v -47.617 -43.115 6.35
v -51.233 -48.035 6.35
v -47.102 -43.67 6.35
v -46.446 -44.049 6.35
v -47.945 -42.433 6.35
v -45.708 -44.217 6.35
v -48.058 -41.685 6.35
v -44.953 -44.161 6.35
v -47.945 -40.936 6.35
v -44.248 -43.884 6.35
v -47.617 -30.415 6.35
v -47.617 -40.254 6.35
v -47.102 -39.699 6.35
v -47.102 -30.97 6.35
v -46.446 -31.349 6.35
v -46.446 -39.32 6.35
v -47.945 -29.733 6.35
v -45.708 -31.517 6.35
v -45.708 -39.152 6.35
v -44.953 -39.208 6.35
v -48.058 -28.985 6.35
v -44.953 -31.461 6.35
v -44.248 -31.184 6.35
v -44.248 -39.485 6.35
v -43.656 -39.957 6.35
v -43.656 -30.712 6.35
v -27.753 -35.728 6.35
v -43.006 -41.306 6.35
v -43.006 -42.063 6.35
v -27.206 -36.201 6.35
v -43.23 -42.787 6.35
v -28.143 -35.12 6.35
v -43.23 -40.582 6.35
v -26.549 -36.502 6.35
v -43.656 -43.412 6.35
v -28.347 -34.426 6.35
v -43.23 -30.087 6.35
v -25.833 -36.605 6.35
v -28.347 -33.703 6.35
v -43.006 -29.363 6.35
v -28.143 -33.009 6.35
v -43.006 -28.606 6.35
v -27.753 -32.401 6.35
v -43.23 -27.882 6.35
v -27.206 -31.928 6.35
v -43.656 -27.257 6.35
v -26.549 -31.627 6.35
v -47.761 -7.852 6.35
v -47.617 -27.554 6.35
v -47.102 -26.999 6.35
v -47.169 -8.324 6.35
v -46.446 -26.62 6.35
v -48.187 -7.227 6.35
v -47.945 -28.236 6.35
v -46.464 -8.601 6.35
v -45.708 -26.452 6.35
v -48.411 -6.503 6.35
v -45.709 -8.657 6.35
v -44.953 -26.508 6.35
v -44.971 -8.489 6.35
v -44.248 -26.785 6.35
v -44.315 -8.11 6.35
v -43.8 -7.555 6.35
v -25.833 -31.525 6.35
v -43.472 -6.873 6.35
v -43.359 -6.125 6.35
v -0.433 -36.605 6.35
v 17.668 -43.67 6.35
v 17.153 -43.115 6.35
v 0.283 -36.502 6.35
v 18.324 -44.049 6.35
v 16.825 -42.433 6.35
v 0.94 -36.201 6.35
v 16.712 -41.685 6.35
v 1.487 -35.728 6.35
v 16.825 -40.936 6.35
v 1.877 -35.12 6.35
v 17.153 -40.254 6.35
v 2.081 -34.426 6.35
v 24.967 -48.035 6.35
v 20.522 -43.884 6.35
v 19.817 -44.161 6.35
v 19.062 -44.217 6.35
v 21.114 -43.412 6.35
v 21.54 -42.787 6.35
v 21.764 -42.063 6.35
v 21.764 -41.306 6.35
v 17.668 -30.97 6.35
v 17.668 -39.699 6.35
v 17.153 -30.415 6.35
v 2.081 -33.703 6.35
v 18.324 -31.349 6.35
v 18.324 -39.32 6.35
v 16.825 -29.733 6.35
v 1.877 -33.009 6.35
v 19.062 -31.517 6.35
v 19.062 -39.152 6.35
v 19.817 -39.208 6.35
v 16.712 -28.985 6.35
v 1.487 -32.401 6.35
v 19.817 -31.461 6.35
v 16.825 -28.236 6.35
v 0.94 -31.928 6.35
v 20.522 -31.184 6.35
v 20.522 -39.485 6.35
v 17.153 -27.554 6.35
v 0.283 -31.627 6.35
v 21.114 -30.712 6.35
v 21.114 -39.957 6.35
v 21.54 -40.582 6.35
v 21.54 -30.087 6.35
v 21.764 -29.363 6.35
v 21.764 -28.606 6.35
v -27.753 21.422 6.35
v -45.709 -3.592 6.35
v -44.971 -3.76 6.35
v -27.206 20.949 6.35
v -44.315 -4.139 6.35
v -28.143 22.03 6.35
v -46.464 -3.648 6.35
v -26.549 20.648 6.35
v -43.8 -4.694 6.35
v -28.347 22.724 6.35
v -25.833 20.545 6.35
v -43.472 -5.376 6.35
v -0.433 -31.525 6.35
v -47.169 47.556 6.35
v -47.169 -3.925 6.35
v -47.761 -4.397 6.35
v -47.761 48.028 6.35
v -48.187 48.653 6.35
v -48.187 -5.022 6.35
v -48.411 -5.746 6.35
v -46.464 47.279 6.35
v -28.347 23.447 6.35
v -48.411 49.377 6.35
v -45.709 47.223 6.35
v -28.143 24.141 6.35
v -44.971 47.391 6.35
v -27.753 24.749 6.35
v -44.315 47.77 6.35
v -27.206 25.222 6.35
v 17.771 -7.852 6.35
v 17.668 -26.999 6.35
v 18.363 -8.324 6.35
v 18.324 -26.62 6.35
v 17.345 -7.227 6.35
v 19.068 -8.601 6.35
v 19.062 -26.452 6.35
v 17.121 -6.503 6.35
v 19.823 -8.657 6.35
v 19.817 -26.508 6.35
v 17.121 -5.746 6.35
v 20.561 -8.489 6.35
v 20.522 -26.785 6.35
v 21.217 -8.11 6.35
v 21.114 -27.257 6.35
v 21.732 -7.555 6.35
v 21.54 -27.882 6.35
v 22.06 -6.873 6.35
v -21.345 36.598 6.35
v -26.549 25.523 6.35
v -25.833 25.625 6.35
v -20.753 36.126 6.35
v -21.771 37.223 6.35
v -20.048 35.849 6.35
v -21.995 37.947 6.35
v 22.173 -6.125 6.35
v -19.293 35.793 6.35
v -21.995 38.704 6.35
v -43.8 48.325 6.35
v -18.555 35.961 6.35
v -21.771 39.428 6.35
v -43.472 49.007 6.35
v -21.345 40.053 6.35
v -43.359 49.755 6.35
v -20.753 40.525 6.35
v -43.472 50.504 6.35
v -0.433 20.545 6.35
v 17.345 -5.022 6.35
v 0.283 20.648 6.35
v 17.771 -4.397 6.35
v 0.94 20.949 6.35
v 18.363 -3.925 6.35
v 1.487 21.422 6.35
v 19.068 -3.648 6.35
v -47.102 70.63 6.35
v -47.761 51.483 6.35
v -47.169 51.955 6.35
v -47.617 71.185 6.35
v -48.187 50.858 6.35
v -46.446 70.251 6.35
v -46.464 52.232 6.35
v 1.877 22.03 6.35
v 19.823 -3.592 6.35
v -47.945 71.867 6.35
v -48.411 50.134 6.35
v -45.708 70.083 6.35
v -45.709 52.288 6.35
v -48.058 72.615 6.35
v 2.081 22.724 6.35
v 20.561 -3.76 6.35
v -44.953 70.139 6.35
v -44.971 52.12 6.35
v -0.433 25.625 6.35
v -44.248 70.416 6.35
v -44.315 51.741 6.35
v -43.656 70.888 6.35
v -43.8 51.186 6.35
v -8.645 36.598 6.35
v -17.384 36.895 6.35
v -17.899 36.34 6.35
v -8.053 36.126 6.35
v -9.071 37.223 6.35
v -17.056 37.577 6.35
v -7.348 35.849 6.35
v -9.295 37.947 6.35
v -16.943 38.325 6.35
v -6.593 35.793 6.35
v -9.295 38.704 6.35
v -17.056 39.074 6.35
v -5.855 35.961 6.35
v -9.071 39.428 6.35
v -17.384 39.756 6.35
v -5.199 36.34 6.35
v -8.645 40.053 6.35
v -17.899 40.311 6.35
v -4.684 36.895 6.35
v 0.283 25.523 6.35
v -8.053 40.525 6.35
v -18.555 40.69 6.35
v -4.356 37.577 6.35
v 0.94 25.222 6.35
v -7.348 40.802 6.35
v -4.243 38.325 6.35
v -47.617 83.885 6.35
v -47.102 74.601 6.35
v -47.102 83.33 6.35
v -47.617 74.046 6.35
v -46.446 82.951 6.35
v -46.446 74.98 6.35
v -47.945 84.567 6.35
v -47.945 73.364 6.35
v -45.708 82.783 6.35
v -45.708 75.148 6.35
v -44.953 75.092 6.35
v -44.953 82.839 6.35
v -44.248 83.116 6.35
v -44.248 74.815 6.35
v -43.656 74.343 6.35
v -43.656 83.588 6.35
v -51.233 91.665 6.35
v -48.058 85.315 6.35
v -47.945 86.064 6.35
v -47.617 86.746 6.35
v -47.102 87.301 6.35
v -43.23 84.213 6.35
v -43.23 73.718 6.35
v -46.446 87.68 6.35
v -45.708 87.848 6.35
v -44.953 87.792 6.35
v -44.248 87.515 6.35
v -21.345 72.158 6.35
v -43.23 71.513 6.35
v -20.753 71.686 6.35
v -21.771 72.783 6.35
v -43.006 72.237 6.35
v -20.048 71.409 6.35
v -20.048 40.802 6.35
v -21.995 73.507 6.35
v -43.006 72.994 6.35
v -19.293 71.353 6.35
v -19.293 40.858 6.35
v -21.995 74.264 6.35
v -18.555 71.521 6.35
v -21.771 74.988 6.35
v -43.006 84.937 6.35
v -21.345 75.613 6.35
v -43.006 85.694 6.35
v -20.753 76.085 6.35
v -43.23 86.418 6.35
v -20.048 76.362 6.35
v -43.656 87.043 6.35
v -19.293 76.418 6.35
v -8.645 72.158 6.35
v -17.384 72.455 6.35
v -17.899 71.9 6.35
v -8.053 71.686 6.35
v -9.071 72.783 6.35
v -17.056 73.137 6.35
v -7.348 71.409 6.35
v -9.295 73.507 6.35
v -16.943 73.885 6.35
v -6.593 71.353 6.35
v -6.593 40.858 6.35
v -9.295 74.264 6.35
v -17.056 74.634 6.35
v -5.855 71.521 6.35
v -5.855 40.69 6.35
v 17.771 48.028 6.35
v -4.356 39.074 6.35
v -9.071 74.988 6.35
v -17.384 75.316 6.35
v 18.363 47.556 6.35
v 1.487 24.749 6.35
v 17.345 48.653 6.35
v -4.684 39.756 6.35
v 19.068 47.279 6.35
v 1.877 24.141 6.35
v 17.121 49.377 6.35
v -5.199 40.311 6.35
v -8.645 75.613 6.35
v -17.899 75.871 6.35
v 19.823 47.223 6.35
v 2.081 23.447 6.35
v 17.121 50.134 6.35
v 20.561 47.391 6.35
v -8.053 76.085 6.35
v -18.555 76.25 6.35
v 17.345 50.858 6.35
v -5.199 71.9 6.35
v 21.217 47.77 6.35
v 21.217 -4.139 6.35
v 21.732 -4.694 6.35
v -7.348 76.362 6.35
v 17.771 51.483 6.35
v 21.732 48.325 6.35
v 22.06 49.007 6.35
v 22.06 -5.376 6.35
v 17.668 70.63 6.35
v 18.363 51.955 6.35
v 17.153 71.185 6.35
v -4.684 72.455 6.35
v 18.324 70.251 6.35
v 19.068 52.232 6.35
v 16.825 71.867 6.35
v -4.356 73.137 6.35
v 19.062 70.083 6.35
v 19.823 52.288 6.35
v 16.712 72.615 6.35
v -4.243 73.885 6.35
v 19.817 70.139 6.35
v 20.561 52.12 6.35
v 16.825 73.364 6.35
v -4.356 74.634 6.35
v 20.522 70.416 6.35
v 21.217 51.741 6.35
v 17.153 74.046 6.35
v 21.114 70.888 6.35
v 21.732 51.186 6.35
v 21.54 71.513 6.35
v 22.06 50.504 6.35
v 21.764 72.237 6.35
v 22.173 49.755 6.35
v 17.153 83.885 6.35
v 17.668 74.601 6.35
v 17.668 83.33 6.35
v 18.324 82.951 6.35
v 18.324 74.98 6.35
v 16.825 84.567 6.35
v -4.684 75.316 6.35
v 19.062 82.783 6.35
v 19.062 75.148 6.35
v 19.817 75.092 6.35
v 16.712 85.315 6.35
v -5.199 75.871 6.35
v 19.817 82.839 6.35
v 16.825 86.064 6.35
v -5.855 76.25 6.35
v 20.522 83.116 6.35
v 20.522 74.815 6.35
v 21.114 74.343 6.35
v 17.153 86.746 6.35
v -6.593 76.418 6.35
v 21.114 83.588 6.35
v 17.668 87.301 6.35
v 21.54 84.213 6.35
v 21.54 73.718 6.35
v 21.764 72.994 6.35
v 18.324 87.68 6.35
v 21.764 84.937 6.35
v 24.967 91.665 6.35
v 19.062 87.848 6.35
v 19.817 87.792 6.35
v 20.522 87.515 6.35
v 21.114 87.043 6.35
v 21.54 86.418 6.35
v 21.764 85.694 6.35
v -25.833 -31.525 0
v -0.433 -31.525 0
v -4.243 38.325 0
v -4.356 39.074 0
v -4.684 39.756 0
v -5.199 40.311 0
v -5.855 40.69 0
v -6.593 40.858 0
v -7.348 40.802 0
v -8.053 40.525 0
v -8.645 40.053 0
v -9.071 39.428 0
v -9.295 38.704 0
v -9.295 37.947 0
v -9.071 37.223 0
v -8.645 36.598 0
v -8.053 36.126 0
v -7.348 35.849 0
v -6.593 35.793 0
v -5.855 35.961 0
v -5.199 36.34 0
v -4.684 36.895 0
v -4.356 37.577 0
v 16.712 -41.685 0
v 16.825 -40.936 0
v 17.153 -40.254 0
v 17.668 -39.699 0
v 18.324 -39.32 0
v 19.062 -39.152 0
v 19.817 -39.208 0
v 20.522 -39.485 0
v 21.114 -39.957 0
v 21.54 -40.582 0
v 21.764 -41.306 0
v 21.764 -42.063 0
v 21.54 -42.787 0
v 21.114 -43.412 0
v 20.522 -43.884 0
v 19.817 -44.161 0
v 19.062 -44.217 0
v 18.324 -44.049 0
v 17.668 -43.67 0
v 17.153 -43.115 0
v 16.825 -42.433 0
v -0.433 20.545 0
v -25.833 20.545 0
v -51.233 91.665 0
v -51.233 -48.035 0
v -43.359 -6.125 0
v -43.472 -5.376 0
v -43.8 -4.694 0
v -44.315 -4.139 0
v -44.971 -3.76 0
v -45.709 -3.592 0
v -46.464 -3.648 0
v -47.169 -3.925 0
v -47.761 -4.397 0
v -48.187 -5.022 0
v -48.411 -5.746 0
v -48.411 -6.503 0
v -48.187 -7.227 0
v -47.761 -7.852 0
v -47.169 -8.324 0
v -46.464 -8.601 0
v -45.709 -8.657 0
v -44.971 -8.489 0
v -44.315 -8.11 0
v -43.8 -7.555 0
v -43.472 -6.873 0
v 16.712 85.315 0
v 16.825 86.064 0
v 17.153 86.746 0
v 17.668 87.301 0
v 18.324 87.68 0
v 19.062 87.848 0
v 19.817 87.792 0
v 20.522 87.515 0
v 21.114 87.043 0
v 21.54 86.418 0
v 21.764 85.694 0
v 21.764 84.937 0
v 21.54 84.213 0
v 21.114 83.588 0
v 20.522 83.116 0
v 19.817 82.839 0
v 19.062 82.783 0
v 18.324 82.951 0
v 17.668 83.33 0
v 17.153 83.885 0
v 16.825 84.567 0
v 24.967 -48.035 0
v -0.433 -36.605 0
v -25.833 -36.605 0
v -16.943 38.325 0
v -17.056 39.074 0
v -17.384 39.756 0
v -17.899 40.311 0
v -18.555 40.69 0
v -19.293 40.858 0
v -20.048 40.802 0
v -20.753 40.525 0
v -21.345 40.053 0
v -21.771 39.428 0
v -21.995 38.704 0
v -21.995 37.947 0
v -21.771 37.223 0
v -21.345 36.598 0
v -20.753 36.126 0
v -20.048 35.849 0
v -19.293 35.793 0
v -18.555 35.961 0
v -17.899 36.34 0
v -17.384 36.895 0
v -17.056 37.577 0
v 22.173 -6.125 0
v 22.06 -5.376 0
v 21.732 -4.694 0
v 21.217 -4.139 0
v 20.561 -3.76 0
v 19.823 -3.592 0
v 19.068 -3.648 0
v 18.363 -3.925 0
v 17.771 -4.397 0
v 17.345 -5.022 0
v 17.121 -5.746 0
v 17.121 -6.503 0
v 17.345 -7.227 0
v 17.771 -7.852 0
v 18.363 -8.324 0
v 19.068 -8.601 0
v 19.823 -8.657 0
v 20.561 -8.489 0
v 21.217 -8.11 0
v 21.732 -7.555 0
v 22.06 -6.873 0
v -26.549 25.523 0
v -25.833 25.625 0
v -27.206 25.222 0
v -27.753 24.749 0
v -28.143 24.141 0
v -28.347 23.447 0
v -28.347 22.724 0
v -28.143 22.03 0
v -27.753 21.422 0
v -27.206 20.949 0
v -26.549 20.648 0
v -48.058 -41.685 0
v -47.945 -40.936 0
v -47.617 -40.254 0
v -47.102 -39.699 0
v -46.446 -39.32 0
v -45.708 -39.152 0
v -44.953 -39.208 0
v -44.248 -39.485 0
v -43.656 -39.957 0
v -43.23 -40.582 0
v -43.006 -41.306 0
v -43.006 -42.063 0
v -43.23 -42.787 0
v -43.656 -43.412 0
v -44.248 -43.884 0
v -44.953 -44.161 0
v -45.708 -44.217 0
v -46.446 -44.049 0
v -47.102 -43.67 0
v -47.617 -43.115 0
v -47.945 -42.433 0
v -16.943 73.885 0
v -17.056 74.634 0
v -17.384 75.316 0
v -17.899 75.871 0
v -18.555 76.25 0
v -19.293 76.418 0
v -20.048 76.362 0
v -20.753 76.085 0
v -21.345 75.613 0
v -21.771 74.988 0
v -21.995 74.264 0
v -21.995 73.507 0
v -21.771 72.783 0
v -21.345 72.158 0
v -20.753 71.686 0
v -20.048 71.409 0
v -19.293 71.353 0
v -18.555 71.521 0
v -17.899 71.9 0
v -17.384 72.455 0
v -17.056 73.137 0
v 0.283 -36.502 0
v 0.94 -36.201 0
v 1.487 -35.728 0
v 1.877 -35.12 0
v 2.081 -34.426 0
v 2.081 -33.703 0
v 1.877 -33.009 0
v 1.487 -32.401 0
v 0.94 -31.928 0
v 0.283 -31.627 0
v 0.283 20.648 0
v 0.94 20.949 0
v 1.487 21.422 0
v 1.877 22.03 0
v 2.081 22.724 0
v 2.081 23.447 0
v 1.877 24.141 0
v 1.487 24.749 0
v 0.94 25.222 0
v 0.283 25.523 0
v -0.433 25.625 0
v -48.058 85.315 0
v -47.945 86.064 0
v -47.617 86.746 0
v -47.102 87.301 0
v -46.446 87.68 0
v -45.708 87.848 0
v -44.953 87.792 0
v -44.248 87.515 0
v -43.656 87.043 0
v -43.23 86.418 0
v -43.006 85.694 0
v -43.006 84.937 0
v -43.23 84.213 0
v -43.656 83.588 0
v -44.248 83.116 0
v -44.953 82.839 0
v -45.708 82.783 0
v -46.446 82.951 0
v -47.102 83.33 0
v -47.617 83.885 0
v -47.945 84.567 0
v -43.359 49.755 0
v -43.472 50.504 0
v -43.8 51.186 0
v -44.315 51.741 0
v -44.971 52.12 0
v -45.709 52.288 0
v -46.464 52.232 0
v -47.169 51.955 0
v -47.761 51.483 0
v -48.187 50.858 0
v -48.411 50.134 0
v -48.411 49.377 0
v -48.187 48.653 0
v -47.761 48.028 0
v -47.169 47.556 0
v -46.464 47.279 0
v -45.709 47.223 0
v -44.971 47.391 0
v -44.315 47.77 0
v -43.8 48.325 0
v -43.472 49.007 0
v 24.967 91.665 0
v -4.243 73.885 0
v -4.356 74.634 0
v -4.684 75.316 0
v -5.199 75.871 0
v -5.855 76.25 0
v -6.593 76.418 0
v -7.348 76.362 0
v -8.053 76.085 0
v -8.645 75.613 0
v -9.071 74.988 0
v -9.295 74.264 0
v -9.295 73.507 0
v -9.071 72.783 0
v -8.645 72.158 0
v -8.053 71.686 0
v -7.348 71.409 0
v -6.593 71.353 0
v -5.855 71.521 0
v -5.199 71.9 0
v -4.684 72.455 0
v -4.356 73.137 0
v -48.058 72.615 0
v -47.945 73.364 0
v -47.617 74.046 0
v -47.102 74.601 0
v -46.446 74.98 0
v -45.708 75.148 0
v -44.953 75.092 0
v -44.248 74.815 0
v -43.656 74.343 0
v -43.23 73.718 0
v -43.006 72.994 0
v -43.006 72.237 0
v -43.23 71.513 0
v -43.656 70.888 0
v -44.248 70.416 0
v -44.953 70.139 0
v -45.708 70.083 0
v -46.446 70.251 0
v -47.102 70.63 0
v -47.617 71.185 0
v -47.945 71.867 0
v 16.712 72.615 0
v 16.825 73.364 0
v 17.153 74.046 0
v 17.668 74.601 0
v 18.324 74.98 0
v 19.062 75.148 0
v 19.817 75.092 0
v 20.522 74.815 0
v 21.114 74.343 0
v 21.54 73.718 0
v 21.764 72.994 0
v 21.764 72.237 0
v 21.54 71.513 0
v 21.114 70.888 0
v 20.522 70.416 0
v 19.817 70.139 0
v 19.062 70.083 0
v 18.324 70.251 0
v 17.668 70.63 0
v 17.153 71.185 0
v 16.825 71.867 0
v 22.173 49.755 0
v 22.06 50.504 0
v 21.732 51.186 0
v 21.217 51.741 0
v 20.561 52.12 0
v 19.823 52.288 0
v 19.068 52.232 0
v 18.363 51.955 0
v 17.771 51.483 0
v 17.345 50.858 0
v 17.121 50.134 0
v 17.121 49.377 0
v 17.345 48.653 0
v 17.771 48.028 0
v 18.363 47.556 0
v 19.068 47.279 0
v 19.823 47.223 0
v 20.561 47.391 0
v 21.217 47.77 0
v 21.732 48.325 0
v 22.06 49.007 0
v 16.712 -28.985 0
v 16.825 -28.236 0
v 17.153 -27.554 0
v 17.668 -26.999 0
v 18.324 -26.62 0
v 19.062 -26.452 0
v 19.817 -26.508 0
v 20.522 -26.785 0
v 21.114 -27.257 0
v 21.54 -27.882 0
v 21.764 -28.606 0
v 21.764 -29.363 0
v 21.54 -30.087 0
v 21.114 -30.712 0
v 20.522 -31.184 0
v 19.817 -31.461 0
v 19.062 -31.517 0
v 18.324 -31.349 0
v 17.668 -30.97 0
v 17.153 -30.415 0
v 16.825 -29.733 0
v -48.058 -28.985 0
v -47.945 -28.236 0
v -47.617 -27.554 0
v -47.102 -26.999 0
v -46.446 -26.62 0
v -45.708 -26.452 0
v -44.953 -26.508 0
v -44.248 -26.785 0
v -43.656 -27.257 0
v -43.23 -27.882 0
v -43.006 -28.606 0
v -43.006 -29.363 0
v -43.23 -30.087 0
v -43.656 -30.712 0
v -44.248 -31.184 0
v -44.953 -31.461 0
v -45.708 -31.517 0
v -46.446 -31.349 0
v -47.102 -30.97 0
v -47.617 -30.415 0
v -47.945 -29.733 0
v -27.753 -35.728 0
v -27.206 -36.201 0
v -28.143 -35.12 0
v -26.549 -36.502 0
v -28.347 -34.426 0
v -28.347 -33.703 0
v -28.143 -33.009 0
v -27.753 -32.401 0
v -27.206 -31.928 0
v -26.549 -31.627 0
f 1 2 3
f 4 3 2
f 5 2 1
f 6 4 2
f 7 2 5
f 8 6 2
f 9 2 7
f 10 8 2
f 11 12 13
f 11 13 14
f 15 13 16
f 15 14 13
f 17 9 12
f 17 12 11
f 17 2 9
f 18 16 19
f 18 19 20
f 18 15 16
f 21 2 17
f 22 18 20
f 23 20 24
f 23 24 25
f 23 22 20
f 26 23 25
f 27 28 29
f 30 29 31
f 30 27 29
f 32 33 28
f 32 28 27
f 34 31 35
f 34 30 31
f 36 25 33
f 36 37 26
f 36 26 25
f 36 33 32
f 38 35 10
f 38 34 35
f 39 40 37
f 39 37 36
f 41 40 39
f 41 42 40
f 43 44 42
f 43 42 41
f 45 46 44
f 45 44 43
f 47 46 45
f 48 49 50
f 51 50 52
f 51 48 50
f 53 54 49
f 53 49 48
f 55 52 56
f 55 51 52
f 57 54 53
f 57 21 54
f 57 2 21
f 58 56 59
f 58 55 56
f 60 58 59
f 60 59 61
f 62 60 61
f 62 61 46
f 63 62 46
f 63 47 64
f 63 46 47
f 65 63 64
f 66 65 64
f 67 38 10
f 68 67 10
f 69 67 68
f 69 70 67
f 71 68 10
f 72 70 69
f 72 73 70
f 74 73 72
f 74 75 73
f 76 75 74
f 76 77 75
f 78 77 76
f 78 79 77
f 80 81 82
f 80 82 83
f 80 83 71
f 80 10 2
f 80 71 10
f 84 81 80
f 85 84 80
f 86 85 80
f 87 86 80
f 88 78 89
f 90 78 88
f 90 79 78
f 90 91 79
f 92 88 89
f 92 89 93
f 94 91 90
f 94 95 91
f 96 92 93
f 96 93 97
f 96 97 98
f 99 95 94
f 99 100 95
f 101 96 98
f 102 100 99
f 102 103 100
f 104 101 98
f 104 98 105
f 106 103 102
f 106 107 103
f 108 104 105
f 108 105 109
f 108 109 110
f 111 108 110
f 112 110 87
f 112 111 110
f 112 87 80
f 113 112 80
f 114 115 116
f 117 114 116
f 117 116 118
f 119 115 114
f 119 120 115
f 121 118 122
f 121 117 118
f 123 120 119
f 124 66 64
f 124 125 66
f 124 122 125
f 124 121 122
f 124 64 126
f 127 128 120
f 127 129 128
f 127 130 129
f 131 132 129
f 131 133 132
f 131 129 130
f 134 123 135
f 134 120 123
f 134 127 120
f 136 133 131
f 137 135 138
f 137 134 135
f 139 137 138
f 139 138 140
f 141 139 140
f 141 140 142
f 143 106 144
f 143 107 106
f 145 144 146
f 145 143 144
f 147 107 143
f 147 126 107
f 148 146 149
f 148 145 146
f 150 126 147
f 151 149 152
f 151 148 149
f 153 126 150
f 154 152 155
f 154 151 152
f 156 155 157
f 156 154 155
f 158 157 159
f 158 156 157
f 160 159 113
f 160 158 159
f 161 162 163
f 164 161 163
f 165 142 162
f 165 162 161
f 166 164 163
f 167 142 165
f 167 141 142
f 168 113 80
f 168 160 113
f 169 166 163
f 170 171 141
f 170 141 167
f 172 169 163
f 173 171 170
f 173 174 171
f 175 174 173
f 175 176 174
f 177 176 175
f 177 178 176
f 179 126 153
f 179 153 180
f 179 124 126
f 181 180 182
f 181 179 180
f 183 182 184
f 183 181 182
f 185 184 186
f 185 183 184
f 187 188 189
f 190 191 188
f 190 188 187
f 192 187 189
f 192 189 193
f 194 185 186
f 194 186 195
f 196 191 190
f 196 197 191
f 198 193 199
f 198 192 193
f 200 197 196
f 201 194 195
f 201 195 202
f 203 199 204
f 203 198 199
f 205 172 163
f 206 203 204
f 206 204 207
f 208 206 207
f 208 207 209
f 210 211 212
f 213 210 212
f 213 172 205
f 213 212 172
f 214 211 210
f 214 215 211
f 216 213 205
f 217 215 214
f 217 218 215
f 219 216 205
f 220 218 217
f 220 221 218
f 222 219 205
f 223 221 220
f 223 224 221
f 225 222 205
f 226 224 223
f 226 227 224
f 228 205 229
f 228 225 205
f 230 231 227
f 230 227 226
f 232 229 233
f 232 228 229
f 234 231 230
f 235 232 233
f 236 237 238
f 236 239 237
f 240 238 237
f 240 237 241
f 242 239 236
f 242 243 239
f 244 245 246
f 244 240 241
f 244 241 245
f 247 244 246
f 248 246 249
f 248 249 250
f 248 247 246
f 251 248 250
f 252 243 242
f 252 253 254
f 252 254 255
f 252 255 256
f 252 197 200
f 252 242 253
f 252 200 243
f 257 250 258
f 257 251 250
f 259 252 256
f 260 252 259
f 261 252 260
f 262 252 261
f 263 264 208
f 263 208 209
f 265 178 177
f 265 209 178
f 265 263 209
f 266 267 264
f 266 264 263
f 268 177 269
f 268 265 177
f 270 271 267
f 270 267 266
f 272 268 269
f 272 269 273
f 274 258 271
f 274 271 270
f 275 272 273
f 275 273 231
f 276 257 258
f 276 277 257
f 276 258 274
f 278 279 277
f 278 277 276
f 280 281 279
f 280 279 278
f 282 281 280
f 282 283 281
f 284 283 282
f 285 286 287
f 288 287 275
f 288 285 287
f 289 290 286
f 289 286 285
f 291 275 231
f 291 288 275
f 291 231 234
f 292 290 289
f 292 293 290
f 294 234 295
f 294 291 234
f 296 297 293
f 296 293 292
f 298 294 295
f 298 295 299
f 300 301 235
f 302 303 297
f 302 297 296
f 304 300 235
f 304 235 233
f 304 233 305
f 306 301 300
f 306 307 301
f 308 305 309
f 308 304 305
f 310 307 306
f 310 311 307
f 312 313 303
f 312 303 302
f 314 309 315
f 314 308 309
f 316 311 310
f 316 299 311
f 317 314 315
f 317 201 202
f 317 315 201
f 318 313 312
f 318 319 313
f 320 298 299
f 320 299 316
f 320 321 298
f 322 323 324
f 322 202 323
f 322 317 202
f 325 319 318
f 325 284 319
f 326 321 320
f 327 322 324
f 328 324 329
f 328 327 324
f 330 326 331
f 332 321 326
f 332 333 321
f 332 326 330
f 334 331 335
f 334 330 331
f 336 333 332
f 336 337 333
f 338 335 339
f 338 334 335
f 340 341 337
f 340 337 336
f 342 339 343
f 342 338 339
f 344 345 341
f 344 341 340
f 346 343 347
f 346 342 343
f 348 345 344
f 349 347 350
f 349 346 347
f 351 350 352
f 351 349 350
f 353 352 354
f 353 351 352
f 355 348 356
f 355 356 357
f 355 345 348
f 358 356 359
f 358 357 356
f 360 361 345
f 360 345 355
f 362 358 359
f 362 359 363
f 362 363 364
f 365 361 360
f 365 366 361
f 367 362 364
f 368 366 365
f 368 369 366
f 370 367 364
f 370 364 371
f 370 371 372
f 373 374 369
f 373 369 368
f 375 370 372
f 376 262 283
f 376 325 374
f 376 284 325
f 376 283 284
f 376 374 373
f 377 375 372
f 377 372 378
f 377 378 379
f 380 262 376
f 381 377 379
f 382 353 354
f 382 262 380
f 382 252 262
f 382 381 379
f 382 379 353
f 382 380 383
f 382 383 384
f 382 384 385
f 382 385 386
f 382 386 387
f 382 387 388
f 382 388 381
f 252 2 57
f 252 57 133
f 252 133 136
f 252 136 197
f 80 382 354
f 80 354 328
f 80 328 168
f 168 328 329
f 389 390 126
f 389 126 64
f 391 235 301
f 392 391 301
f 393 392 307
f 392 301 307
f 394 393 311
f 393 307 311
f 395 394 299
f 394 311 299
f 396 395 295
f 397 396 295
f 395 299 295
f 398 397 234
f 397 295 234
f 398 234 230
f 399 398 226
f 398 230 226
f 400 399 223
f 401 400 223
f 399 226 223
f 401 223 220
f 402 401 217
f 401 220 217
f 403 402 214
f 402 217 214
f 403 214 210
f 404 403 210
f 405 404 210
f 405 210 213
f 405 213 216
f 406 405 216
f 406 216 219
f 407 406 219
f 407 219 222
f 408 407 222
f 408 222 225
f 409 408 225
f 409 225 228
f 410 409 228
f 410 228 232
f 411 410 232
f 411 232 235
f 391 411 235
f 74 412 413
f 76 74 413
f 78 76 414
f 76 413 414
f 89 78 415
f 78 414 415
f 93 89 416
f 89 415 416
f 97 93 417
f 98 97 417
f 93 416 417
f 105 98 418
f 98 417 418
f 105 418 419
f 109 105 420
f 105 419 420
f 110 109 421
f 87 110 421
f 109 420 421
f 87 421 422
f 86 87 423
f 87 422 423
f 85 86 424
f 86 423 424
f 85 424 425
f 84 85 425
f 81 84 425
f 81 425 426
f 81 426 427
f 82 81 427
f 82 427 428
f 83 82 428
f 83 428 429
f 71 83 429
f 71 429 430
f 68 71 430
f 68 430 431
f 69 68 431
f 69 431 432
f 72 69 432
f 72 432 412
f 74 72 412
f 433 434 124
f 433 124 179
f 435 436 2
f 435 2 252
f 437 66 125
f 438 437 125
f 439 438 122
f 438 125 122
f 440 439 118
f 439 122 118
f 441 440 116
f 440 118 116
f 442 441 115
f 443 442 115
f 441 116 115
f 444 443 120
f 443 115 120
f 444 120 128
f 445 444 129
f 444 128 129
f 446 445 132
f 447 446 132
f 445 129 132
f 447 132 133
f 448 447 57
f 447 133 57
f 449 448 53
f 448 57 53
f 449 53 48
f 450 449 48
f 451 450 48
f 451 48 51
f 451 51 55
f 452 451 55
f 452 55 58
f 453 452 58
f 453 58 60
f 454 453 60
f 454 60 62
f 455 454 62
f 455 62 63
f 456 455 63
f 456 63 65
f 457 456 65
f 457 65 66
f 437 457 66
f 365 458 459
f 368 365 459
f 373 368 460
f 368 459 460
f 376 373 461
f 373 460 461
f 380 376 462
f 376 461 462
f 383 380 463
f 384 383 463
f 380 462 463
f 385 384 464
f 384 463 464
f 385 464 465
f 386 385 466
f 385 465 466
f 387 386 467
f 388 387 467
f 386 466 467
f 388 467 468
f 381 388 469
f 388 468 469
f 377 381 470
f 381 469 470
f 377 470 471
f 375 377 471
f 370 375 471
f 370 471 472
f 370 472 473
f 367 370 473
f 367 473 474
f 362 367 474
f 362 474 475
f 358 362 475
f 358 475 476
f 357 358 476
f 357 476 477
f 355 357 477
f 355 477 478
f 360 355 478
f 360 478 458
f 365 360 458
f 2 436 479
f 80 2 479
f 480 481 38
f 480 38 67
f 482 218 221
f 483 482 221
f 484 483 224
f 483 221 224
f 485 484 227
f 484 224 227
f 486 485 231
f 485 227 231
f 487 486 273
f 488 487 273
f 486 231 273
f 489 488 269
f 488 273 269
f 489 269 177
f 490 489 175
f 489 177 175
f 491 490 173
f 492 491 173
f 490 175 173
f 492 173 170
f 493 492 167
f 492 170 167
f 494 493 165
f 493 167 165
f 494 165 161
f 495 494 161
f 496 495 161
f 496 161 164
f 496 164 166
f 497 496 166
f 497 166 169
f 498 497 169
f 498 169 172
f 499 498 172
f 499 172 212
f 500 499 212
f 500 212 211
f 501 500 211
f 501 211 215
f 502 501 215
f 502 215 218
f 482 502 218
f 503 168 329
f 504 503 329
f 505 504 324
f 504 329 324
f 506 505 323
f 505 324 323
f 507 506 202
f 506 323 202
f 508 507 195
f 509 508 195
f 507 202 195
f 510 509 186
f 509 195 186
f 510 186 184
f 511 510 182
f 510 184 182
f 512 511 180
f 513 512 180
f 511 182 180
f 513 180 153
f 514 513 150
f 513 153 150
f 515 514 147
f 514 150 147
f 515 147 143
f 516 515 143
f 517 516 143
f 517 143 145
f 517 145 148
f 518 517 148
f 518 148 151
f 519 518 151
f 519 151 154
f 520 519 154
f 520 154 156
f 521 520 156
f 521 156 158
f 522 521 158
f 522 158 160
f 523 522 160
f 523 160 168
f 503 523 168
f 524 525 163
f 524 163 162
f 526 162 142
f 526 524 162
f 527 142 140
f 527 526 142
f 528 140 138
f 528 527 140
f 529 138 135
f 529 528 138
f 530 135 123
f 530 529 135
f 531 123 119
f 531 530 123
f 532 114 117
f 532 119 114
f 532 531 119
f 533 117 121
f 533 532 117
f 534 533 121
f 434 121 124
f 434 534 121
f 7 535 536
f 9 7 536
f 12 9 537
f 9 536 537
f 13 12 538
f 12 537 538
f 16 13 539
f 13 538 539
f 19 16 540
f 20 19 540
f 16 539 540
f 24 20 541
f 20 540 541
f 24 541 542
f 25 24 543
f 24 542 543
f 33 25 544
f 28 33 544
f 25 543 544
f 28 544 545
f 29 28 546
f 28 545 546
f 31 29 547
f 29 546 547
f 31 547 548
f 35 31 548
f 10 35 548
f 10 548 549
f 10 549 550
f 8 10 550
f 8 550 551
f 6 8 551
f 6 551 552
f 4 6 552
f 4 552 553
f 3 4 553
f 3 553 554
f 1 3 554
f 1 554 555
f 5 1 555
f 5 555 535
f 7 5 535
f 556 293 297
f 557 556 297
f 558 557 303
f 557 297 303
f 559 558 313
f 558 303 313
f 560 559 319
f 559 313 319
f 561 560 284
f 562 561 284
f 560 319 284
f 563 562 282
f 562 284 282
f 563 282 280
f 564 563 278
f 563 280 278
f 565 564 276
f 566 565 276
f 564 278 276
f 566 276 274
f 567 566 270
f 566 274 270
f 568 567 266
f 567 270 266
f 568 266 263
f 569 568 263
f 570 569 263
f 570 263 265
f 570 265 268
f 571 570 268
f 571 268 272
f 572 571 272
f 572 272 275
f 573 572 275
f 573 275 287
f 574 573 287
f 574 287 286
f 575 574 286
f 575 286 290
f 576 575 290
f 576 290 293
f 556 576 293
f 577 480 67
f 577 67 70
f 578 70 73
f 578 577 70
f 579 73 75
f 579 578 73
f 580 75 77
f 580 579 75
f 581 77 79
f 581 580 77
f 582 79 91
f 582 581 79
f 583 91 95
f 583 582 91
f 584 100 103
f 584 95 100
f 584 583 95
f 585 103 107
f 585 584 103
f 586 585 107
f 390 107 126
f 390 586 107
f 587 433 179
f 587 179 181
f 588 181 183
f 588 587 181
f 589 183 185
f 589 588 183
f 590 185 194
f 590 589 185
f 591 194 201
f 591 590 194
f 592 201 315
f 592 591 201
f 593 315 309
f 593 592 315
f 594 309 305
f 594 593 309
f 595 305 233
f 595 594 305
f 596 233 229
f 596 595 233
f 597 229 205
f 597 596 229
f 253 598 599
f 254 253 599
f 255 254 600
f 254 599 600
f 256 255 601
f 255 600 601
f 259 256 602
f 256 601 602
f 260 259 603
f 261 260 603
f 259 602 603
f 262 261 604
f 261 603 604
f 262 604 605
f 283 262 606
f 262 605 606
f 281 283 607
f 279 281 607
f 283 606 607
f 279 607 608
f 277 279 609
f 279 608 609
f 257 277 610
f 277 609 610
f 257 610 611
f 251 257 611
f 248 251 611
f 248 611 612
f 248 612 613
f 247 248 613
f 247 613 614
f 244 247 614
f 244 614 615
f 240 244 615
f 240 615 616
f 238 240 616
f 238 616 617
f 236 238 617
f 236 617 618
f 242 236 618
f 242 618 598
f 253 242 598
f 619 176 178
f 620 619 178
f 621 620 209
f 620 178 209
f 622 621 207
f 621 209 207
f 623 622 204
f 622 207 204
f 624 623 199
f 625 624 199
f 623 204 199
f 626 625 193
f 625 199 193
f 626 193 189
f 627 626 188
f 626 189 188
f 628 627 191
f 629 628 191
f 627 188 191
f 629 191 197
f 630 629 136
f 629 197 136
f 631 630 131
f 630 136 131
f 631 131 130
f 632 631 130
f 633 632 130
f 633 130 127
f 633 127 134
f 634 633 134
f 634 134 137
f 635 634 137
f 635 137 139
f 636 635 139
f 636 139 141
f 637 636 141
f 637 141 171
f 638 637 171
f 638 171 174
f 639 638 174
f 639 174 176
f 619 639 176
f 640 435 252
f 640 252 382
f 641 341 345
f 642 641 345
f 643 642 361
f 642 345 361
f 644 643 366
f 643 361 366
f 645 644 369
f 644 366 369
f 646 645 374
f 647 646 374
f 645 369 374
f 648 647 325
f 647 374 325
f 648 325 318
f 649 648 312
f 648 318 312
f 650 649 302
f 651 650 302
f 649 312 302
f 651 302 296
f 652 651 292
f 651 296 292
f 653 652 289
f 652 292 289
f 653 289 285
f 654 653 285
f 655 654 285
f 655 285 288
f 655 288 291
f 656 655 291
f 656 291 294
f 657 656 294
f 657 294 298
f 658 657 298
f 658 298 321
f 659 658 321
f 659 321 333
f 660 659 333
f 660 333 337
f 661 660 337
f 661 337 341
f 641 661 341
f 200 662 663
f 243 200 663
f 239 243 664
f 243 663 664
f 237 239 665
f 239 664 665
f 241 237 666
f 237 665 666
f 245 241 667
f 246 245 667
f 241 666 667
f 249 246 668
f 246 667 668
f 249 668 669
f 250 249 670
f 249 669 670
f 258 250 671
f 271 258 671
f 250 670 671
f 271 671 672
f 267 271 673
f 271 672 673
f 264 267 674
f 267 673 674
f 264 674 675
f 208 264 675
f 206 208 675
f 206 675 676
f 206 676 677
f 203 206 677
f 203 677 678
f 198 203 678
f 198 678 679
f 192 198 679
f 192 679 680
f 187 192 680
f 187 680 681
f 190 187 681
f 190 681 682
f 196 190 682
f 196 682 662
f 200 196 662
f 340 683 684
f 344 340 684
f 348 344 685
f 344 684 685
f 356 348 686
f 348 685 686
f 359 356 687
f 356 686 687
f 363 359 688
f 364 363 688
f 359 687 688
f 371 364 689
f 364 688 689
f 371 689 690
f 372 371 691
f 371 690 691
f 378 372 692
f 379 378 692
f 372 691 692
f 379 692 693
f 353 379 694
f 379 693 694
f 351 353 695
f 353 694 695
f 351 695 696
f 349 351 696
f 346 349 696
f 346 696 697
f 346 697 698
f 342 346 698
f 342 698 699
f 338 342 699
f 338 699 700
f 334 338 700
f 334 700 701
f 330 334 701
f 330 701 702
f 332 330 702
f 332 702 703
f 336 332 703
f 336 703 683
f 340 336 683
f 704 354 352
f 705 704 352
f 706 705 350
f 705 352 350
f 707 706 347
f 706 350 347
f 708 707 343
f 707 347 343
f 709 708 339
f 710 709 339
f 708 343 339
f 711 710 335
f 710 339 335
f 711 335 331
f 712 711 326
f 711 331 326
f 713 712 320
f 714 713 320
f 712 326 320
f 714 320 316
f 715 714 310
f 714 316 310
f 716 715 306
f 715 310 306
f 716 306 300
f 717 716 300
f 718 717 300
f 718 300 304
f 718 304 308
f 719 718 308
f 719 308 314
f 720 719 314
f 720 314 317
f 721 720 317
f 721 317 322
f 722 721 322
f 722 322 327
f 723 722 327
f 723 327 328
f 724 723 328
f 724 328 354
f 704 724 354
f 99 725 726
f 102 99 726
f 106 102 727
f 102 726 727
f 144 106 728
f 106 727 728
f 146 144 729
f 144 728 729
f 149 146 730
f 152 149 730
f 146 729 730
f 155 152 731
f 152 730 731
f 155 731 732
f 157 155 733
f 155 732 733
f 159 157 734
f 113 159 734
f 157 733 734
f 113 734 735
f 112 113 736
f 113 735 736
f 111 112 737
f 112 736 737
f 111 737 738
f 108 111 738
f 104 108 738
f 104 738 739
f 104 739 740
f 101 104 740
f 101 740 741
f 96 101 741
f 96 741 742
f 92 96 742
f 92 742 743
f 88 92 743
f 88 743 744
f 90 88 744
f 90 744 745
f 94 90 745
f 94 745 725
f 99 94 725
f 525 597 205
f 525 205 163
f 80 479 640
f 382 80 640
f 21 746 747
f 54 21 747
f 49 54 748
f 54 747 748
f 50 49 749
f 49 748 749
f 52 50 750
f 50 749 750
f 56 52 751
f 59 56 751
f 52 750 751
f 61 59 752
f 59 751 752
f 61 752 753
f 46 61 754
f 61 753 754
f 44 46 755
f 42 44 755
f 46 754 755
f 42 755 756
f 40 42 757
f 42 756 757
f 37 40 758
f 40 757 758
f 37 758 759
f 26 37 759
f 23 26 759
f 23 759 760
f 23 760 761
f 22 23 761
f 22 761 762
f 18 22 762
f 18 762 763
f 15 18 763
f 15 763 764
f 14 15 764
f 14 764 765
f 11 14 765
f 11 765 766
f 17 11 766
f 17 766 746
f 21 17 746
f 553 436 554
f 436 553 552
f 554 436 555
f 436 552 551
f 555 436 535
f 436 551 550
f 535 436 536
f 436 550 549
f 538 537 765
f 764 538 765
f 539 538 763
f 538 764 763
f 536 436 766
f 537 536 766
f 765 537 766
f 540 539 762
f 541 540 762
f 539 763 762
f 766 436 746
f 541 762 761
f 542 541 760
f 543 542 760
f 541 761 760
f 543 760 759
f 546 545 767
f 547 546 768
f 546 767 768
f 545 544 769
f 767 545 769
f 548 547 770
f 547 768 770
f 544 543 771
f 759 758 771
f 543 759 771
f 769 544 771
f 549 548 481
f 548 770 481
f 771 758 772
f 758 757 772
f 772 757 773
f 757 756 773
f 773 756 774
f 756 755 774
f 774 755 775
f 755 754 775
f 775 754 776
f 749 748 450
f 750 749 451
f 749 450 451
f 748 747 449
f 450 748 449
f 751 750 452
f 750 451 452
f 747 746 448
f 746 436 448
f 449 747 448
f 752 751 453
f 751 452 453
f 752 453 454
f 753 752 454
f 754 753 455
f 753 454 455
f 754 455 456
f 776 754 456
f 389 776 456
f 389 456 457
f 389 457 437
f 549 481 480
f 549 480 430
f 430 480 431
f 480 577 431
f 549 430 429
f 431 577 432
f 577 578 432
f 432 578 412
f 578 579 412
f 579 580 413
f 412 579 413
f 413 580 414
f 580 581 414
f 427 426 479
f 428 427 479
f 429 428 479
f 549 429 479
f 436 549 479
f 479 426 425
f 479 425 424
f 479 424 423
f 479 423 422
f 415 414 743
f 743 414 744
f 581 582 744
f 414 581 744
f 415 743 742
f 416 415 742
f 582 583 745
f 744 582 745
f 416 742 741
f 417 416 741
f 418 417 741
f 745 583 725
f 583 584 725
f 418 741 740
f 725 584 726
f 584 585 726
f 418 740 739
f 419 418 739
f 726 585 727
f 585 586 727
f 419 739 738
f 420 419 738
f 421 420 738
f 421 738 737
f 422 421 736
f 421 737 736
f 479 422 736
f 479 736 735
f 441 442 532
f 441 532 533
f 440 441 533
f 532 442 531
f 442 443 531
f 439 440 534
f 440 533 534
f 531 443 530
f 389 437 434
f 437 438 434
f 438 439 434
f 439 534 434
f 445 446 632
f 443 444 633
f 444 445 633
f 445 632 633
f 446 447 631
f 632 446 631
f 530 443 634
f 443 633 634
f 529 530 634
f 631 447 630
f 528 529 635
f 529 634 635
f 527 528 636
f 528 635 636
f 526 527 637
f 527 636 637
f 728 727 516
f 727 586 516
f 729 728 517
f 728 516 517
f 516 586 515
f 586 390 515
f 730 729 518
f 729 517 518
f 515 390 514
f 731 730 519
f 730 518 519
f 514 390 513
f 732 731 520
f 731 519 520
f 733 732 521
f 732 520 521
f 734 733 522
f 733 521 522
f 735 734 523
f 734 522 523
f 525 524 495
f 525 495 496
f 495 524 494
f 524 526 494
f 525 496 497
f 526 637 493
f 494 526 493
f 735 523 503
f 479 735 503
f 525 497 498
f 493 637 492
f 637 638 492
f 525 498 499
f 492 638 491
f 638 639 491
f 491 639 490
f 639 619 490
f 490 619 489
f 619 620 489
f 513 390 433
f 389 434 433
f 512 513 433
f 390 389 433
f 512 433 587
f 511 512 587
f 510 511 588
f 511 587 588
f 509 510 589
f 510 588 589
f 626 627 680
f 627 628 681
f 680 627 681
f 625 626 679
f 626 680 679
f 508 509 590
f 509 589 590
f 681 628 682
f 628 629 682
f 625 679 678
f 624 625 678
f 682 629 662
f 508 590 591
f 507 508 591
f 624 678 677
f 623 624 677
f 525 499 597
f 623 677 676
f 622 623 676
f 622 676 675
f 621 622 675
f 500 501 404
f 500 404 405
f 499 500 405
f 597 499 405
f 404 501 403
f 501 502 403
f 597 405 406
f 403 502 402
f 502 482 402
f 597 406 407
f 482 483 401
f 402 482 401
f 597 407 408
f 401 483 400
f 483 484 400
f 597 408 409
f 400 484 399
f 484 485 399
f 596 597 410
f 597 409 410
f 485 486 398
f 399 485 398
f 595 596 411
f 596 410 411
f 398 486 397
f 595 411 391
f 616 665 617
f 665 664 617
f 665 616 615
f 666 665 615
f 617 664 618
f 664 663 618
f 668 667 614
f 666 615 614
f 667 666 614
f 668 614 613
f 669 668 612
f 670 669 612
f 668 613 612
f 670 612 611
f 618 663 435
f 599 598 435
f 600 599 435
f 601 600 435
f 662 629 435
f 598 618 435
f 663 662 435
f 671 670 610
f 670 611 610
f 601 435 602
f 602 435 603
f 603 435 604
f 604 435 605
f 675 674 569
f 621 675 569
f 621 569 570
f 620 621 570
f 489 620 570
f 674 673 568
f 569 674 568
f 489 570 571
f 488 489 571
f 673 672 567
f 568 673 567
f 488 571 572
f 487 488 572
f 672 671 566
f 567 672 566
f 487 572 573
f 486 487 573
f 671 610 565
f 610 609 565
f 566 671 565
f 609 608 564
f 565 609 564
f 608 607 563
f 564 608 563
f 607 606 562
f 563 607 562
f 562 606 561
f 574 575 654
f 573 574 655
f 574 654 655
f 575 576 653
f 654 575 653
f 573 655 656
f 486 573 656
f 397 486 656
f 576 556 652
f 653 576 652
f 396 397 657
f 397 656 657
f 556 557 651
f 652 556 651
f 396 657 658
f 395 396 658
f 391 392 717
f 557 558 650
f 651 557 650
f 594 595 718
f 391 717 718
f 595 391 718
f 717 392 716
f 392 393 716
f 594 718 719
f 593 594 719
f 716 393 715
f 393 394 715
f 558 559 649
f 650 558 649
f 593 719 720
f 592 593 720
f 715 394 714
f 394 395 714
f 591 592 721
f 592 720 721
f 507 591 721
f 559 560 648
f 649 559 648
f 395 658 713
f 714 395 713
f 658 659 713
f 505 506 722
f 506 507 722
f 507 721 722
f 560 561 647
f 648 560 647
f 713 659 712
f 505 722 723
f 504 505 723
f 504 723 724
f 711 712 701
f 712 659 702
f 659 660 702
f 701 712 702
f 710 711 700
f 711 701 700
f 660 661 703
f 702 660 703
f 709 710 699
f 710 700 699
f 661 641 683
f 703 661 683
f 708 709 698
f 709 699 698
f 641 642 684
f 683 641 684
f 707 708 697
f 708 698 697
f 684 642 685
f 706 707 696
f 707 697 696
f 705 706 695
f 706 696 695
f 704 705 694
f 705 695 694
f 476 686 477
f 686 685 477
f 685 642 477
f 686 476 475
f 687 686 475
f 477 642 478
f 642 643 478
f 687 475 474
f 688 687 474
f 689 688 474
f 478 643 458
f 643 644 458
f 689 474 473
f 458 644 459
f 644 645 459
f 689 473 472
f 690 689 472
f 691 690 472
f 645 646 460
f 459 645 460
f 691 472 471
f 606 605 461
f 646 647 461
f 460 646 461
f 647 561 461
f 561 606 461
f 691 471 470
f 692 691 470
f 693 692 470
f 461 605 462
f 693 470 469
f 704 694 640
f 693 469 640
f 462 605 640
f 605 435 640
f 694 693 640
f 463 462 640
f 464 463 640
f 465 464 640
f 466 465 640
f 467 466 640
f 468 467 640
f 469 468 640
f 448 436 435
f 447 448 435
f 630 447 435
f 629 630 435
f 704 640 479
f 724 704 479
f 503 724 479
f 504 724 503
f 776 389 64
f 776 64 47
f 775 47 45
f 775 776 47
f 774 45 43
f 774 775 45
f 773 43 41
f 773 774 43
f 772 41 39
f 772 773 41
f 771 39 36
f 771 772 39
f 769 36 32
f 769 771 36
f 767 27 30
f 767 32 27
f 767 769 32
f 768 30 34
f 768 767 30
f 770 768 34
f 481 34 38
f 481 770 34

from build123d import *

# Parameters (mm, degrees)
SKETCH1_W           = 76.2
SKETCH1_H           = 139.7
BOSS_EXTRUDE1_DEPTH = 6.35
SKETCH2_R           = 2.54
CUT_EXTRUDE1_DEPTH  = 15.24
SKETCH3_R           = 2.54
CUT_EXTRUDE2_DEPTH  = 15.24
SKETCH4_R           = 2.54
CUT_EXTRUDE3_DEPTH  = 7.62
CUT_EXTRUDE4_DEPTH  = 7.62


with BuildPart() as part:
    # Sketch1 → Boss-Extrude1 (new body)
    with BuildSketch(Plane.XY):
        with Locations((-13.133014553, 21.815443873)):
            Rectangle(SKETCH1_W, SKETCH1_H)
    extrude(amount=BOSS_EXTRUDE1_DEPTH)

    # Sketch2 → Cut-Extrude1 (cut)
    with BuildSketch(Plane(origin=(0, 0, 0), x_dir=(-1, 0, 0), z_dir=(0, 0, -1))):
        with Locations((45.518014553, 85.315443873)):
            Circle(SKETCH2_R)
        with Locations((45.518014553, 72.615443873)):
            Circle(SKETCH2_R)
        with Locations((45.518014553, -28.984556127)):
            Circle(SKETCH2_R)
        with Locations((45.518014553, -41.684556127)):
            Circle(SKETCH2_R)
        with Locations((-19.251985447, -41.684556127)):
            Circle(SKETCH2_R)
        with Locations((-19.251985447, -28.984556127)):
            Circle(SKETCH2_R)
        with Locations((-19.251985447, 85.315443873)):
            Circle(SKETCH2_R)
        with Locations((-19.251985447, 72.615443873)):
            Circle(SKETCH2_R)
    extrude(amount=-CUT_EXTRUDE1_DEPTH, mode=Mode.SUBTRACT)

    # Sketch3 → Cut-Extrude2 (cut)
    with BuildSketch(Plane.XY.offset(6.35)):
        with Locations((-19.483014553, 38.325443873)):
            Circle(SKETCH3_R)
        with Locations((-6.783014553, 38.325443873)):
            Circle(SKETCH3_R)
        with Locations((-19.483014553, 73.885443873)):
            Circle(SKETCH3_R)
        with Locations((-6.783014553, 73.885443873)):
            Circle(SKETCH3_R)
    extrude(amount=-CUT_EXTRUDE2_DEPTH, mode=Mode.SUBTRACT)

    # Sketch4 → Cut-Extrude3 (cut)
    with BuildSketch(Plane.XY.offset(6.35)):
        with Locations((-45.899014553, 49.755443873)):
            Circle(SKETCH4_R)
        with Locations((-45.899014553, -6.124556127)):
            Circle(SKETCH4_R)
        with Locations((19.632985447, -6.124556127)):
            Circle(SKETCH4_R)
        with Locations((19.632985447, 49.755443873)):
            Circle(SKETCH4_R)
    extrude(amount=-CUT_EXTRUDE3_DEPTH, mode=Mode.SUBTRACT)

    # Sketch5 → Cut-Extrude4 (cut)
    with BuildSketch(Plane(origin=(0, 0, 0), x_dir=(-1, 0, 0), z_dir=(0, 0, -1))):
        with BuildLine():
            Line((0.433014553, 25.625443873), (25.833014553, 25.625443873))
            ThreePointArc((25.833014553, 25.625443873), (28.373014553, 23.085443873), (25.833014553, 20.545443873))
            Line((25.833014553, 20.545443873), (0.433014553, 20.545443873))
            ThreePointArc((0.433014553, 20.545443873), (-2.106985447, 23.085443873), (0.433014553, 25.625443873))
        make_face()
        with BuildLine():
            Line((0.433014553, -31.524556127), (25.833014553, -31.524556127))
            ThreePointArc((25.833014553, -31.524556127), (28.373014553, -34.064556127), (25.833014553, -36.604556127))
            Line((25.833014553, -36.604556127), (0.433014553, -36.604556127))
            ThreePointArc((0.433014553, -36.604556127), (-2.106985447, -34.064556127), (0.433014553, -31.524556127))
        make_face()
    extrude(amount=-CUT_EXTRUDE4_DEPTH, mode=Mode.SUBTRACT)


solid = part.part
